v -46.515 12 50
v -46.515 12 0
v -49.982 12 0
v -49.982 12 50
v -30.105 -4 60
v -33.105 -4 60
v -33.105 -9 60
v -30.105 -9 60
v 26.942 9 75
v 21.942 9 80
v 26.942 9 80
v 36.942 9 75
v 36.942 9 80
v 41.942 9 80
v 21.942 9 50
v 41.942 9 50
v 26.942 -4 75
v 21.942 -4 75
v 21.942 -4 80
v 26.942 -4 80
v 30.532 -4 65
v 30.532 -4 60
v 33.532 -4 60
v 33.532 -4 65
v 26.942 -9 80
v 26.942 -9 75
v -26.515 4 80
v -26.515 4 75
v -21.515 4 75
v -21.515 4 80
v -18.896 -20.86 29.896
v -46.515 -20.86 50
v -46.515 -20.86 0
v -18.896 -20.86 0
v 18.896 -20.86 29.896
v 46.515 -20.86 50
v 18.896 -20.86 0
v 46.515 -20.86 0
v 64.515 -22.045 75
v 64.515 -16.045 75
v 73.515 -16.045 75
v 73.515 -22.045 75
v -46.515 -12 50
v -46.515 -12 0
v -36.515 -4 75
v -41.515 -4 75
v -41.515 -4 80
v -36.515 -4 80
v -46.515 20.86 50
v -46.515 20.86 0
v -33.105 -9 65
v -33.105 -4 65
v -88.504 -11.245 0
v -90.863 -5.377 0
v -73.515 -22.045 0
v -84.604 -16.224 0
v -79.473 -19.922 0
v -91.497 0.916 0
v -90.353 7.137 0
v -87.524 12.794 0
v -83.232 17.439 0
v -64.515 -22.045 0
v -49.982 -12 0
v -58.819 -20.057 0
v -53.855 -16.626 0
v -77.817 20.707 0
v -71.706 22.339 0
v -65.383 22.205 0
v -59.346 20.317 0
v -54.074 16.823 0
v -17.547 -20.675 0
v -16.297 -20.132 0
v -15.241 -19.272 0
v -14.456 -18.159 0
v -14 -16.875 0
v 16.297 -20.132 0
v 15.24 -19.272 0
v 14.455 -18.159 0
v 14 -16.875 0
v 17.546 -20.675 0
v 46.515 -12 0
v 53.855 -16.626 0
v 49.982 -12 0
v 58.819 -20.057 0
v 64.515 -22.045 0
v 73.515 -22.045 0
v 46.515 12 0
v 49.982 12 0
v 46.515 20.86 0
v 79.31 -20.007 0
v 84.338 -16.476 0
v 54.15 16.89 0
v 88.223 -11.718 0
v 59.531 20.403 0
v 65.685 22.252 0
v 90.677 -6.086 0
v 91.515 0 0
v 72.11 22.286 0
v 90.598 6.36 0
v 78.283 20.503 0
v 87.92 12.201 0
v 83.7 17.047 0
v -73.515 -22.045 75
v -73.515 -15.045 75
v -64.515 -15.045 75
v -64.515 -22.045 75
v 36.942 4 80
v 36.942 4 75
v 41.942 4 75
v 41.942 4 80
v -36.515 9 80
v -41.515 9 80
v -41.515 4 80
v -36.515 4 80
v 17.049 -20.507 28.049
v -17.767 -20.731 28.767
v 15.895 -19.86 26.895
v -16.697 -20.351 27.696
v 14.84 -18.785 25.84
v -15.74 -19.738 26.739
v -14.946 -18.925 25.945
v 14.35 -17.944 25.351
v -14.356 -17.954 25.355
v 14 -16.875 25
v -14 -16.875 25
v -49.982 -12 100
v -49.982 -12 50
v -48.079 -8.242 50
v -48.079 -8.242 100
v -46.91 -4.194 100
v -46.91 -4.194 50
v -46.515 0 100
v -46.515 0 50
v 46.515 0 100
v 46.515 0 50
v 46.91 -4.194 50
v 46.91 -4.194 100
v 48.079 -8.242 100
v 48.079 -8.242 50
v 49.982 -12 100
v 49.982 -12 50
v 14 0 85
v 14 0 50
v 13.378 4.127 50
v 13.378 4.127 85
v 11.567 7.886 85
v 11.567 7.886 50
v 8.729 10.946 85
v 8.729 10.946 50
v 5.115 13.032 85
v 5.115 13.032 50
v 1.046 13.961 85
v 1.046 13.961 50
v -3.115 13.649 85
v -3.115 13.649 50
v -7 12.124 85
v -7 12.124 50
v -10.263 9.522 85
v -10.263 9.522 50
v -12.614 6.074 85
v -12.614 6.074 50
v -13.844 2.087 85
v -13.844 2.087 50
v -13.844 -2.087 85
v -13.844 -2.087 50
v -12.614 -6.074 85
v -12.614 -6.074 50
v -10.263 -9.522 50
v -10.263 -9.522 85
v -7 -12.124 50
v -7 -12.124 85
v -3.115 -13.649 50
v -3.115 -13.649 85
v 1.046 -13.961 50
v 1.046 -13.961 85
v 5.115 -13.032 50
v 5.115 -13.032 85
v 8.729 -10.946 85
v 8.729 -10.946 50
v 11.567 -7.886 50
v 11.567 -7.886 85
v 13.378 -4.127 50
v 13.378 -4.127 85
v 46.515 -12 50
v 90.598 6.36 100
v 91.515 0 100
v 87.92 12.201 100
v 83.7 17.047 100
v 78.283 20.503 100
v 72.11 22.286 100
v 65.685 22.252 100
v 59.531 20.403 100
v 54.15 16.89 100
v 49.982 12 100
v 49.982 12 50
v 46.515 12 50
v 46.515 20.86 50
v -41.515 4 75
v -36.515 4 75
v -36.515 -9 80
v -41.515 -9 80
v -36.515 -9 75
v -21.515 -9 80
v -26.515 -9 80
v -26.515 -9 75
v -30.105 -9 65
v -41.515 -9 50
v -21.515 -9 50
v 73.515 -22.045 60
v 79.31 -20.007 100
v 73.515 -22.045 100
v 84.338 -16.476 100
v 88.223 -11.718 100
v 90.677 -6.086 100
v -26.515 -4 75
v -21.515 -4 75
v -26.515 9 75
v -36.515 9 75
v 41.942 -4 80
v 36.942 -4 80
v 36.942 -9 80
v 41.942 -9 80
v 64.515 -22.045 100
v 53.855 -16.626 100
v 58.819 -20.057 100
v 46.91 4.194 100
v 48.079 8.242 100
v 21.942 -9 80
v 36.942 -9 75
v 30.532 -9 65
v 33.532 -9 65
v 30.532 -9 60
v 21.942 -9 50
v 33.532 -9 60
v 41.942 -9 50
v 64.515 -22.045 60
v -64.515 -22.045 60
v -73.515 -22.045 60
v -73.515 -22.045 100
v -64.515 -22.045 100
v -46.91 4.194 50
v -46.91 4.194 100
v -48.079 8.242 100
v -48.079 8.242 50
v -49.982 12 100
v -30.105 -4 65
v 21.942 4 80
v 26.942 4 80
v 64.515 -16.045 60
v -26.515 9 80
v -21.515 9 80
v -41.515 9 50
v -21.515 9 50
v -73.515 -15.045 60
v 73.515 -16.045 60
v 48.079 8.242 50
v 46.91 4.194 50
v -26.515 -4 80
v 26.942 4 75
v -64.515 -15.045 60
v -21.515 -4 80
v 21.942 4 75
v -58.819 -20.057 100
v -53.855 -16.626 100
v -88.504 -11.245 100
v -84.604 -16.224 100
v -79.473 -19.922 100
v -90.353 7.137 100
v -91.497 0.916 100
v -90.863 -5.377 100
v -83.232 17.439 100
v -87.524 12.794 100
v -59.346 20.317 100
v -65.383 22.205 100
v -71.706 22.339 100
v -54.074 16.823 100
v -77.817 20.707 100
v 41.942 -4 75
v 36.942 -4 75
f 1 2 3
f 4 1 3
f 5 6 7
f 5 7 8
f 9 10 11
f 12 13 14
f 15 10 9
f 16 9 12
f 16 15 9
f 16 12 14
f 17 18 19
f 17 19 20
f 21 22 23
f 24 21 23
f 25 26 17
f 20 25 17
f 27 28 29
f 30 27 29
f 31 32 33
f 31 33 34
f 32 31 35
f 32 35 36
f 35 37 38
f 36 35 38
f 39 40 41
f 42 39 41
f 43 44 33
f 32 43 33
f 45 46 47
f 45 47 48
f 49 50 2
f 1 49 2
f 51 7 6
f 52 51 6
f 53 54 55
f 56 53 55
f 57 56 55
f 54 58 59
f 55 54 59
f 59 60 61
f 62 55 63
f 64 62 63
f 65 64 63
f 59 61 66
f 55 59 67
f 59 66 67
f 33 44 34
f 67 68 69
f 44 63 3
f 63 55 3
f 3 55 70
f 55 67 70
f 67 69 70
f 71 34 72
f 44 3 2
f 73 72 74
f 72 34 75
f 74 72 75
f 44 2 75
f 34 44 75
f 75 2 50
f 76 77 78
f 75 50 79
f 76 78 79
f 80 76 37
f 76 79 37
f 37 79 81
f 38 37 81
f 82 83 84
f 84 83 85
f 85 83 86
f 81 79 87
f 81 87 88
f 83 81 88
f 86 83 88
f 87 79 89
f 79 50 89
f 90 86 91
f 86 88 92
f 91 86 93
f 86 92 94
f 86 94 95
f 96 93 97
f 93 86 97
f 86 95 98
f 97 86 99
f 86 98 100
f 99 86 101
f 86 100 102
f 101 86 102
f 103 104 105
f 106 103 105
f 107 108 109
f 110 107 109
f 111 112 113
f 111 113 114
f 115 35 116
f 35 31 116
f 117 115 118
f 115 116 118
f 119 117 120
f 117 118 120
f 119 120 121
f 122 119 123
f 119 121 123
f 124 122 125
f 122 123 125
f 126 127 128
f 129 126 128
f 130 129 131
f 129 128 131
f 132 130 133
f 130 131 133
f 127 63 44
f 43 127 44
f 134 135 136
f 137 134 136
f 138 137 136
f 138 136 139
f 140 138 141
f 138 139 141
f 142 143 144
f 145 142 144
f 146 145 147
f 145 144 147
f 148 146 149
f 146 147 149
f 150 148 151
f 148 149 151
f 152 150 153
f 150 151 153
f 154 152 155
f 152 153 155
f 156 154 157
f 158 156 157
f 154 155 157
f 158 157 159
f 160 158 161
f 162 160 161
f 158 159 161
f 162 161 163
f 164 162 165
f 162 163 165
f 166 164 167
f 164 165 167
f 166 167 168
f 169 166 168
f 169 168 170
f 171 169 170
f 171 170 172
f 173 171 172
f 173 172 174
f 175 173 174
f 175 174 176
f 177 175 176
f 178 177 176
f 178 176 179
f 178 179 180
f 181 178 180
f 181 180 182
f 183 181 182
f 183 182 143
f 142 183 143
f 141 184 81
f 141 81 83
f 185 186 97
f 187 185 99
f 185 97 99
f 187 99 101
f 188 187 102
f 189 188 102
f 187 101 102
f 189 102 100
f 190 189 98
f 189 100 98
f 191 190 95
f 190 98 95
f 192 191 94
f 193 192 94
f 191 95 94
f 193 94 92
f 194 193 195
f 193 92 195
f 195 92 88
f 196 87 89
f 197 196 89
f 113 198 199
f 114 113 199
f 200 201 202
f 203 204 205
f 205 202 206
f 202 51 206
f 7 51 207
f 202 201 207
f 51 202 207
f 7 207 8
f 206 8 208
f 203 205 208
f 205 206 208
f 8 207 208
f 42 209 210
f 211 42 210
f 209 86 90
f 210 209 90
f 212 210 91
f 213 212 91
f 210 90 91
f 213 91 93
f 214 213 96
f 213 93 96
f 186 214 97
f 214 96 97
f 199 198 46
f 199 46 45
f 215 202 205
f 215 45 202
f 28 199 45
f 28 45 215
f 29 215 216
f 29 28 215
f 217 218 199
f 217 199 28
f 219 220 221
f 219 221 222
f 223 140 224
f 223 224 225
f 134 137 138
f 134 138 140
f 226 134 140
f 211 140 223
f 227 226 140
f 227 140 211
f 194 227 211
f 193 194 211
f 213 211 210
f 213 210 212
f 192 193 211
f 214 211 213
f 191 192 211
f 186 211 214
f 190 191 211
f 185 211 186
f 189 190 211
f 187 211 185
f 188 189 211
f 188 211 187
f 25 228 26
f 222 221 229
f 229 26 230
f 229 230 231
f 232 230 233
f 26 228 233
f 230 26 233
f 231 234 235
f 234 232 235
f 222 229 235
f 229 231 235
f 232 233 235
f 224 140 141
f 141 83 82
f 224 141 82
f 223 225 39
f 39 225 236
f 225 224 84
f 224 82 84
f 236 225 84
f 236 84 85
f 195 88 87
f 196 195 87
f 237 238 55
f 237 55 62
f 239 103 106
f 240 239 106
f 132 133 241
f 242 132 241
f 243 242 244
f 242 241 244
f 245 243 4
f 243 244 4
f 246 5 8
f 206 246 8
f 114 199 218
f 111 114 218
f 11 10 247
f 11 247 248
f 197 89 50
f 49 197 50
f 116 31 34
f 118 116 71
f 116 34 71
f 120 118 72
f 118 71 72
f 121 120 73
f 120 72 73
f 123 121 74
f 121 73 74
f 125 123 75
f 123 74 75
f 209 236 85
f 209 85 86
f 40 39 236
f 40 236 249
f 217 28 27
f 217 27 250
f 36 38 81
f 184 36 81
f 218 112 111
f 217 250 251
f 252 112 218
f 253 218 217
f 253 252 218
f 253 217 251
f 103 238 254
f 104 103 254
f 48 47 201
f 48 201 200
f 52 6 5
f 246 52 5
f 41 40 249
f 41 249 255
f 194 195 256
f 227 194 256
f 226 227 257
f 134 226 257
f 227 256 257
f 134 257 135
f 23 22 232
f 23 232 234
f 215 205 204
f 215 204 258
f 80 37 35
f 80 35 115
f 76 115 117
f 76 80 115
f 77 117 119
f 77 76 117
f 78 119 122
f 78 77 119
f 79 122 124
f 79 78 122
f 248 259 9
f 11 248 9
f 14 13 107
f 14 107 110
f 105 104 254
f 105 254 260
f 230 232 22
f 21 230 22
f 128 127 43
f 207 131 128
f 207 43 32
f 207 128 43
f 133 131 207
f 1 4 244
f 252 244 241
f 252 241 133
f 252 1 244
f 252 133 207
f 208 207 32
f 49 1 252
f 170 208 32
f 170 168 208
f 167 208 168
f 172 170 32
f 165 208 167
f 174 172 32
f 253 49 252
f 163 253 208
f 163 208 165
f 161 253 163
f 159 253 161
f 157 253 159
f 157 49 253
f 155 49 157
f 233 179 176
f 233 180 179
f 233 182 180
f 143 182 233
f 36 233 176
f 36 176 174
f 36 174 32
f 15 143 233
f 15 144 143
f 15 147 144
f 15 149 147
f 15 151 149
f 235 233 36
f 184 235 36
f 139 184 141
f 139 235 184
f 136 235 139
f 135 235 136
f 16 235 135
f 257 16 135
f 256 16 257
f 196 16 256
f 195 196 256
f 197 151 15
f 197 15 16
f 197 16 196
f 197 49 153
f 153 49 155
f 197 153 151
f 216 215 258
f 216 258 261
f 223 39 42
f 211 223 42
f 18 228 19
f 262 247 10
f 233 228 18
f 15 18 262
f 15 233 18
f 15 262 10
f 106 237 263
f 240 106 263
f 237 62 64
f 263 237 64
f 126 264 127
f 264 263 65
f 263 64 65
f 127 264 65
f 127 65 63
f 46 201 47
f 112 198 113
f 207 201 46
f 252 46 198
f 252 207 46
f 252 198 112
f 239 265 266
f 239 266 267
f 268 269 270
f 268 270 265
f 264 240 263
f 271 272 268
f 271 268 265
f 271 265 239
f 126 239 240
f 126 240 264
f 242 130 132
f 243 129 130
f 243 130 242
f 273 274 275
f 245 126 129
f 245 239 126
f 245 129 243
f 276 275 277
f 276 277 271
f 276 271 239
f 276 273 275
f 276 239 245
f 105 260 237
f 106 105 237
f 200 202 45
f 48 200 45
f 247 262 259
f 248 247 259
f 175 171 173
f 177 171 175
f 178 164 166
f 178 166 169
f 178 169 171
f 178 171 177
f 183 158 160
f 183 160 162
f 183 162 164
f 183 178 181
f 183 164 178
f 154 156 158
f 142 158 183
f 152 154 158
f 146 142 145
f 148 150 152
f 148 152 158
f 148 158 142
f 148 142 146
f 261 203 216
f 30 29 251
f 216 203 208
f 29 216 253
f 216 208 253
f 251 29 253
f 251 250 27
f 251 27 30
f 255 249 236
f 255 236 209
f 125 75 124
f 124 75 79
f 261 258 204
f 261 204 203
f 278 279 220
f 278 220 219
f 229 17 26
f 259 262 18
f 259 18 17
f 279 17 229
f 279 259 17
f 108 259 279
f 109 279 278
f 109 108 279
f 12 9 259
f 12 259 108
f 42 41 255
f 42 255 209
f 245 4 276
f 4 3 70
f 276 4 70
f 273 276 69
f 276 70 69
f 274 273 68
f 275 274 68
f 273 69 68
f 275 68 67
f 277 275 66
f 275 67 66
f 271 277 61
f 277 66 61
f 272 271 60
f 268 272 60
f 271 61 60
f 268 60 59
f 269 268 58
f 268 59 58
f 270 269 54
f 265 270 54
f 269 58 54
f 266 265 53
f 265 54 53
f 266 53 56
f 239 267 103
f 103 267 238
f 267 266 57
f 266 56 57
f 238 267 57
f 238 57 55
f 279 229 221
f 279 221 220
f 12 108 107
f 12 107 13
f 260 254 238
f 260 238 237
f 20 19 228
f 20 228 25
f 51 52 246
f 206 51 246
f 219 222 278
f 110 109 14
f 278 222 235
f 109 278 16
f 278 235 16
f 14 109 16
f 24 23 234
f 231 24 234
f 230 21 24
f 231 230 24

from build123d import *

# Parameters (mm, degrees)
F1_DEPTH     = 100
F0_R         = 14
F2_DEPTH     = 50
F3_DEPTH     = 75
F4_DEPTH     = 85
F0_W         = 5
F0_H         = 5
F5_DEPTH     = 80
F6_START     = 25
F0_W_2       = 28
F0_H_2       = 3.9854568298
F6_DEPTH     = 25
F7_START     = 75
F0_W_3       = 9
F0_H_3       = 7
F0_H_4       = 6
F7_DEPTH     = 25
F8_DEPTH     = 60
F9_T1_DEPTH  = 28
F9_T3_DEPTH  = 37.2399709343
F9_T9_DEPTH  = 40.2399709343
F9_T13_DEPTH = 37.2399709343
F9_T20_DEPTH = 37.2399709343
F9_T24_DEPTH = 40.2399709343
F10_START    = 65
F0_W_4       = 3
F10_DEPTH    = 10
F11_DEPTH    = 60


# Not quite as in the source:
# - a fillet or chamfer that OpenCascade refuses, or shapes differently, is made with other operations: its cross-section is extruded or revolved along the edge and cut away or added
# - a feature names something its author has since deleted; it is built from what else it names


with BuildPart() as f1:
    # F0 (on Top) → F1 (new body)
    with BuildSketch(Plane.XY):
        with BuildLine():
            ThreePointArc((-49.982315052, -12), (-47.3993365724, -6.2454186413), (-46.5151813626, 0))
            ThreePointArc((-46.5151813626, 0), (-47.3993365724, 6.2454186413), (-49.982315052, 12))
            ThreePointArc((-49.982315052, 12), (-87.5239224573, 12.7936118078), (-73.5151813626, -22.045407685))
            Line((-73.5151813626, -22.045407685), (-73.5151813626, -15.045407685))
            Line((-73.5151813626, -15.045407685), (-64.5151813626, -15.045407685))
            Line((-64.5151813626, -15.045407685), (-64.5151813626, -22.045407685))
            ThreePointArc((-64.5151813626, -22.045407685), (-56.2215695548, -18.5087410947), (-49.982315052, -12))
        make_face()
    extrude(amount=F1_DEPTH)



with BuildPart() as f1b:
    # F0 (on Top) → F1, piece 2 (new body)
    with BuildSketch(Plane.XY):
        with BuildLine():
            ThreePointArc((49.982315052, 12), (47.3993365677, 6.2454186249), (46.5151813626, -3.41e-08))
            ThreePointArc((46.5151813626, -3.41e-08), (47.3993365771, -6.2454186577), (49.982315052, -12))
            ThreePointArc((49.982315052, -12), (56.2215695548, -18.5087410947), (64.5151813626, -22.045407685))
            Line((64.5151813626, -22.045407685), (64.5151813626, -16.045407685))
            Line((64.5151813626, -16.045407685), (73.5151813626, -16.045407685))
            Line((73.5151813626, -16.045407685), (73.5151813626, -22.045407685))
            ThreePointArc((73.5151813626, -22.045407685), (86.4436064206, -14.2302494708), (91.5151813626, 0))
            ThreePointArc((91.5151813626, 0), (75.2606000039, 21.6158447902), (49.982315052, 12))
        make_face()
    extrude(amount=F1_DEPTH)


with BuildPart() as f1_1:
    add(f1.part)

    add(f1b.part)  # F2 merges F1b
    # F0 (on Top) → F2 (join)
    with BuildSketch(Plane.XY):
        Polygon((46.5151813626, 12), (46.5151813626, 20.8604575003), (-46.5151813626, 20.8604575003), (-46.5151813626, 12), (-46.5151813626, 0), (-46.5151813626, -12), (-46.5151813626, -20.8604575003), (-14.0001813626, -20.8604575003), (-14.0001813626, -16.8750006706), (13.9998186374, -16.8750006706), (13.9998186374, -20.8604575003), (46.5151813626, -20.8604575003), (46.5151813626, -12), (46.5151813626, -3.41e-08), align=None)
        Polygon((-26.5151813626, 9), (-21.5151813626, 9), (-21.5151813626, 4), (-21.5151813626, -4), (-21.5151813626, -9), (-26.5151813626, -9), (-30.1052076072, -9), (-33.1052076072, -9), (-36.5151813626, -9), (-41.5151813626, -9), (-41.5151813626, -4), (-41.5151813626, 4), (-41.5151813626, 9), (-36.5151813626, 9), align=None, mode=Mode.SUBTRACT)
        Circle(F0_R, mode=Mode.SUBTRACT)
        Polygon((36.9421700871, 9), (41.9421700871, 9), (41.9421700871, 4), (41.9421700871, -4), (41.9421700871, -9), (36.9421700871, -9), (33.5321700871, -9), (30.5321700871, -9), (26.9421700871, -9), (21.9421700871, -9), (21.9421700871, -4), (21.9421700871, 4), (21.9421700871, 9), (26.9421700871, 9), align=None, mode=Mode.SUBTRACT)
        with BuildLine():
            Line((-46.5151813626, -12), (-46.5151813626, 0))
            ThreePointArc((-46.5151813626, 0), (-47.3993365724, -6.2454186413), (-49.982315052, -12))
            Line((-49.982315052, -12), (-46.5151813626, -12))
        make_face()
        with BuildLine():
            Line((-46.5151813626, 0), (-46.5151813626, 12))
            Line((-46.5151813626, 12), (-49.982315052, 12))
            ThreePointArc((-49.982315052, 12), (-47.3993365724, 6.2454186413), (-46.5151813626, 0))
        make_face()
        with BuildLine():
            ThreePointArc((49.982315052, -12), (47.3993365771, -6.2454186577), (46.5151813626, -3.41e-08))
            Line((46.5151813626, -3.41e-08), (46.5151813626, -12))
            Line((46.5151813626, -12), (49.982315052, -12))
        make_face()
        with BuildLine():
            Line((49.982315052, 12), (46.5151813626, 12))
            Line((46.5151813626, 12), (46.5151813626, -3.41e-08))
            ThreePointArc((46.5151813626, -3.41e-08), (47.3993365677, 6.2454186249), (49.982315052, 12))
        make_face()
    extrude(amount=F2_DEPTH)

    # F0 (on Top) → F3 (join)
    with BuildSketch(Plane.XY):
        Polygon((36.9421700871, 4), (36.9421700871, 9), (26.9421700871, 9), (26.9421700871, 4), (21.9421700871, 4), (21.9421700871, -4), (26.9421700871, -4), (26.9421700871, -9), (30.5321700871, -9), (30.5321700871, -4), (33.5321700871, -4), (33.5321700871, -9), (36.9421700871, -9), (36.9421700871, -4), (41.9421700871, -4), (41.9421700871, 4), align=None)
        Polygon((-26.5151813626, 4), (-26.5151813626, 9), (-36.5151813626, 9), (-36.5151813626, 4), (-41.5151813626, 4), (-41.5151813626, -4), (-36.5151813626, -4), (-36.5151813626, -9), (-33.1052076072, -9), (-33.1052076072, -4), (-30.1052076072, -4), (-30.1052076072, -9), (-26.5151813626, -9), (-26.5151813626, -4), (-21.5151813626, -4), (-21.5151813626, 4), align=None)
    extrude(amount=F3_DEPTH)

    # F0 (on Top) → F4 (join)
    with BuildSketch(Plane.XY):
        Circle(F0_R)
    extrude(amount=F4_DEPTH)

    # F0 (on Top) → F5 (join)
    with BuildSketch(Plane.XY):
        with Locations((-39.0151813626, 6.5)):
            Rectangle(F0_W, F0_H)
        with Locations((-39.0151813626, -6.5)):
            Rectangle(F0_W, F0_H)
        with Locations((-24.0151813626, -6.5)):
            Rectangle(F0_W, F0_H)
        with Locations((-24.0151813626, 6.5)):
            Rectangle(F0_W, F0_H)
        with Locations((24.4421700871, -6.5)):
            Rectangle(F0_W, F0_H)
        with Locations((39.4421700871, -6.5)):
            Rectangle(F0_W, F0_H)
        with Locations((39.4421700871, 6.5)):
            Rectangle(F0_W, F0_H)
        with Locations((24.4421700871, 6.5)):
            Rectangle(F0_W, F0_H)
    extrude(amount=F5_DEPTH)

    # F0 (on Top) → F6 (join)
    with BuildSketch(Plane.XY.offset(F6_START)):
        with Locations((-0.0001813626, -18.8677290854)):
            Rectangle(F0_W_2, F0_H_2)
    extrude(amount=F6_DEPTH)

    # F0 (on Top) → F7 (join)
    with BuildSketch(Plane.XY.offset(F7_START)):
        with Locations((-69.0151813626, -18.545407685)):
            Rectangle(F0_W_3, F0_H_3)
        with Locations((69.0151813626, -19.045407685)):
            Rectangle(F0_W_3, F0_H_4)
    extrude(amount=F7_DEPTH)

    # F0 (on Top) → F8 (join)
    with BuildSketch(Plane.XY):
        with Locations((-69.0151813626, -18.545407685)):
            Rectangle(F0_W_3, F0_H_3)
        with Locations((69.0151813626, -19.045407685)):
            Rectangle(F0_W_3, F0_H_4)
    extrude(amount=F8_DEPTH)

    # F9: fillet of radius 5 on 3 edges, made by hand

    # F9_s2 → F9_t1 (cut)
    with BuildSketch(Plane.YZ.offset(-14.0001813626)):
        with BuildLine():
            ThreePointArc((-20.8604575003, 29.8959883737), (-19.7381317937, 26.7394646412), (-16.8750006706, 25))
            Line((-16.8750006706, 25), (-20.8604575003, 25))
            Line((-20.8604575003, 25), (-20.8604575003, 29.8959883737))
        make_face()
    extrude(amount=F9_T1_DEPTH, mode=Mode.SUBTRACT)

    # F9_s4 → F9_t3 (cut)
    with BuildSketch(Plane.XY.offset(-12.2399709343)):
        with BuildLine():
            ThreePointArc((-18.8961697364, -20.8604575003), (-15.7396460038, -19.7381317937), (-14.0001813626, -16.8750006706))
            Line((-14.0001813626, -16.8750006706), (-14.0001813626, -20.8604575003))
            Line((-14.0001813626, -20.8604575003), (-18.8961697364, -20.8604575003))
        make_face()
        with BuildLine():
            ThreePointArc((18.8958070111, -20.8604575003), (15.7392832785, -19.7381317937), (13.9998186374, -16.8750006706))
            Line((13.9998186374, -16.8750006706), (13.9998186374, -20.8604575003))
            Line((13.9998186374, -20.8604575003), (18.8958070111, -20.8604575003))
        make_face()
    extrude(amount=F9_T3_DEPTH, mode=Mode.SUBTRACT)


with BuildPart() as f9_tool7:
    # F9_s8 → F9_t9 (new body)
    with BuildSketch(Plane.YZ.offset(-26.240152297)):
        with BuildLine():
            ThreePointArc((-20.8604575003, 29.8959883737), (-19.7381317937, 26.7394646412), (-16.8750006706, 25))
            Line((-16.8750006706, 25), (-20.8604575003, 25))
            Line((-20.8604575003, 25), (-20.8604575003, 29.8959883737))
        make_face()
    extrude(amount=F9_T9_DEPTH)

    split(bisect_by=Plane.YZ.offset(-14.0001813626), keep=Keep.BOTTOM)


with BuildPart() as f9_tool11:
    # F9_s12 → F9_t13 (new body)
    with BuildSketch(Plane.XY):
        with BuildLine():
            ThreePointArc((-18.8961697364, -20.8604575003), (-15.7396460038, -19.7381317937), (-14.0001813626, -16.8750006706))
            Line((-14.0001813626, -16.8750006706), (-14.0001813626, -20.8604575003))
            Line((-14.0001813626, -20.8604575003), (-18.8961697364, -20.8604575003))
        make_face()
    extrude(amount=F9_T13_DEPTH)

    split(bisect_by=Plane.XY.offset(25), keep=Keep.TOP)


with BuildPart() as f9_tool7_1:
    add(f9_tool7.part)

    # F9_t15: intersect F9_tool11
    add(f9_tool11.part, mode=Mode.INTERSECT)


with BuildPart() as f1_2:
    add(f1_1.part)

    # F9_t5: cut F9_tool7
    add(f9_tool7_1.part, mode=Mode.SUBTRACT)


with BuildPart() as f9_tool18:
    # F9_s19 → F9_t20 (new body)
    with BuildSketch(Plane.XY):
        with BuildLine():
            ThreePointArc((18.8958070111, -20.8604575003), (15.7392832785, -19.7381317937), (13.9998186374, -16.8750006706))
            Line((13.9998186374, -16.8750006706), (13.9998186374, -20.8604575003))
            Line((13.9998186374, -20.8604575003), (18.8958070111, -20.8604575003))
        make_face()
    extrude(amount=F9_T20_DEPTH)

    split(bisect_by=Plane.XY.offset(25), keep=Keep.TOP)


with BuildPart() as f9_tool22:
    # F9_s23 → F9_t24 (new body)
    with BuildSketch(Plane.YZ.offset(-14.0001813626)):
        with BuildLine():
            ThreePointArc((-20.8604575003, 29.8959883737), (-19.7381317937, 26.7394646412), (-16.8750006706, 25))
            Line((-16.8750006706, 25), (-20.8604575003, 25))
            Line((-20.8604575003, 25), (-20.8604575003, 29.8959883737))
        make_face()
    extrude(amount=F9_T24_DEPTH)

    split(bisect_by=Plane.YZ.offset(13.9998186374), keep=Keep.TOP)


with BuildPart() as f9_tool18_1:
    add(f9_tool18.part)

    # F9_t26: intersect F9_tool22
    add(f9_tool22.part, mode=Mode.INTERSECT)


with BuildPart() as f1_3:
    add(f1_2.part)

    # F9_t16: cut F9_tool18
    add(f9_tool18_1.part, mode=Mode.SUBTRACT)

    # F0 (on Top) → F10 (join)
    with BuildSketch(Plane.XY.offset(F10_START)):
        with Locations((-31.6052076072, -6.5)):
            Rectangle(F0_W_4, F0_H)
        with Locations((32.0321700871, -6.5)):
            Rectangle(F0_W_4, F0_H)
    extrude(amount=F10_DEPTH)

    # F0 (on Top) → F11 (join)
    with BuildSketch(Plane.XY):
        with Locations((-31.6052076072, -6.5)):
            Rectangle(F0_W_4, F0_H)
        with Locations((32.0321700871, -6.5)):
            Rectangle(F0_W_4, F0_H)
    extrude(amount=F11_DEPTH)


solid = f1_3.part
